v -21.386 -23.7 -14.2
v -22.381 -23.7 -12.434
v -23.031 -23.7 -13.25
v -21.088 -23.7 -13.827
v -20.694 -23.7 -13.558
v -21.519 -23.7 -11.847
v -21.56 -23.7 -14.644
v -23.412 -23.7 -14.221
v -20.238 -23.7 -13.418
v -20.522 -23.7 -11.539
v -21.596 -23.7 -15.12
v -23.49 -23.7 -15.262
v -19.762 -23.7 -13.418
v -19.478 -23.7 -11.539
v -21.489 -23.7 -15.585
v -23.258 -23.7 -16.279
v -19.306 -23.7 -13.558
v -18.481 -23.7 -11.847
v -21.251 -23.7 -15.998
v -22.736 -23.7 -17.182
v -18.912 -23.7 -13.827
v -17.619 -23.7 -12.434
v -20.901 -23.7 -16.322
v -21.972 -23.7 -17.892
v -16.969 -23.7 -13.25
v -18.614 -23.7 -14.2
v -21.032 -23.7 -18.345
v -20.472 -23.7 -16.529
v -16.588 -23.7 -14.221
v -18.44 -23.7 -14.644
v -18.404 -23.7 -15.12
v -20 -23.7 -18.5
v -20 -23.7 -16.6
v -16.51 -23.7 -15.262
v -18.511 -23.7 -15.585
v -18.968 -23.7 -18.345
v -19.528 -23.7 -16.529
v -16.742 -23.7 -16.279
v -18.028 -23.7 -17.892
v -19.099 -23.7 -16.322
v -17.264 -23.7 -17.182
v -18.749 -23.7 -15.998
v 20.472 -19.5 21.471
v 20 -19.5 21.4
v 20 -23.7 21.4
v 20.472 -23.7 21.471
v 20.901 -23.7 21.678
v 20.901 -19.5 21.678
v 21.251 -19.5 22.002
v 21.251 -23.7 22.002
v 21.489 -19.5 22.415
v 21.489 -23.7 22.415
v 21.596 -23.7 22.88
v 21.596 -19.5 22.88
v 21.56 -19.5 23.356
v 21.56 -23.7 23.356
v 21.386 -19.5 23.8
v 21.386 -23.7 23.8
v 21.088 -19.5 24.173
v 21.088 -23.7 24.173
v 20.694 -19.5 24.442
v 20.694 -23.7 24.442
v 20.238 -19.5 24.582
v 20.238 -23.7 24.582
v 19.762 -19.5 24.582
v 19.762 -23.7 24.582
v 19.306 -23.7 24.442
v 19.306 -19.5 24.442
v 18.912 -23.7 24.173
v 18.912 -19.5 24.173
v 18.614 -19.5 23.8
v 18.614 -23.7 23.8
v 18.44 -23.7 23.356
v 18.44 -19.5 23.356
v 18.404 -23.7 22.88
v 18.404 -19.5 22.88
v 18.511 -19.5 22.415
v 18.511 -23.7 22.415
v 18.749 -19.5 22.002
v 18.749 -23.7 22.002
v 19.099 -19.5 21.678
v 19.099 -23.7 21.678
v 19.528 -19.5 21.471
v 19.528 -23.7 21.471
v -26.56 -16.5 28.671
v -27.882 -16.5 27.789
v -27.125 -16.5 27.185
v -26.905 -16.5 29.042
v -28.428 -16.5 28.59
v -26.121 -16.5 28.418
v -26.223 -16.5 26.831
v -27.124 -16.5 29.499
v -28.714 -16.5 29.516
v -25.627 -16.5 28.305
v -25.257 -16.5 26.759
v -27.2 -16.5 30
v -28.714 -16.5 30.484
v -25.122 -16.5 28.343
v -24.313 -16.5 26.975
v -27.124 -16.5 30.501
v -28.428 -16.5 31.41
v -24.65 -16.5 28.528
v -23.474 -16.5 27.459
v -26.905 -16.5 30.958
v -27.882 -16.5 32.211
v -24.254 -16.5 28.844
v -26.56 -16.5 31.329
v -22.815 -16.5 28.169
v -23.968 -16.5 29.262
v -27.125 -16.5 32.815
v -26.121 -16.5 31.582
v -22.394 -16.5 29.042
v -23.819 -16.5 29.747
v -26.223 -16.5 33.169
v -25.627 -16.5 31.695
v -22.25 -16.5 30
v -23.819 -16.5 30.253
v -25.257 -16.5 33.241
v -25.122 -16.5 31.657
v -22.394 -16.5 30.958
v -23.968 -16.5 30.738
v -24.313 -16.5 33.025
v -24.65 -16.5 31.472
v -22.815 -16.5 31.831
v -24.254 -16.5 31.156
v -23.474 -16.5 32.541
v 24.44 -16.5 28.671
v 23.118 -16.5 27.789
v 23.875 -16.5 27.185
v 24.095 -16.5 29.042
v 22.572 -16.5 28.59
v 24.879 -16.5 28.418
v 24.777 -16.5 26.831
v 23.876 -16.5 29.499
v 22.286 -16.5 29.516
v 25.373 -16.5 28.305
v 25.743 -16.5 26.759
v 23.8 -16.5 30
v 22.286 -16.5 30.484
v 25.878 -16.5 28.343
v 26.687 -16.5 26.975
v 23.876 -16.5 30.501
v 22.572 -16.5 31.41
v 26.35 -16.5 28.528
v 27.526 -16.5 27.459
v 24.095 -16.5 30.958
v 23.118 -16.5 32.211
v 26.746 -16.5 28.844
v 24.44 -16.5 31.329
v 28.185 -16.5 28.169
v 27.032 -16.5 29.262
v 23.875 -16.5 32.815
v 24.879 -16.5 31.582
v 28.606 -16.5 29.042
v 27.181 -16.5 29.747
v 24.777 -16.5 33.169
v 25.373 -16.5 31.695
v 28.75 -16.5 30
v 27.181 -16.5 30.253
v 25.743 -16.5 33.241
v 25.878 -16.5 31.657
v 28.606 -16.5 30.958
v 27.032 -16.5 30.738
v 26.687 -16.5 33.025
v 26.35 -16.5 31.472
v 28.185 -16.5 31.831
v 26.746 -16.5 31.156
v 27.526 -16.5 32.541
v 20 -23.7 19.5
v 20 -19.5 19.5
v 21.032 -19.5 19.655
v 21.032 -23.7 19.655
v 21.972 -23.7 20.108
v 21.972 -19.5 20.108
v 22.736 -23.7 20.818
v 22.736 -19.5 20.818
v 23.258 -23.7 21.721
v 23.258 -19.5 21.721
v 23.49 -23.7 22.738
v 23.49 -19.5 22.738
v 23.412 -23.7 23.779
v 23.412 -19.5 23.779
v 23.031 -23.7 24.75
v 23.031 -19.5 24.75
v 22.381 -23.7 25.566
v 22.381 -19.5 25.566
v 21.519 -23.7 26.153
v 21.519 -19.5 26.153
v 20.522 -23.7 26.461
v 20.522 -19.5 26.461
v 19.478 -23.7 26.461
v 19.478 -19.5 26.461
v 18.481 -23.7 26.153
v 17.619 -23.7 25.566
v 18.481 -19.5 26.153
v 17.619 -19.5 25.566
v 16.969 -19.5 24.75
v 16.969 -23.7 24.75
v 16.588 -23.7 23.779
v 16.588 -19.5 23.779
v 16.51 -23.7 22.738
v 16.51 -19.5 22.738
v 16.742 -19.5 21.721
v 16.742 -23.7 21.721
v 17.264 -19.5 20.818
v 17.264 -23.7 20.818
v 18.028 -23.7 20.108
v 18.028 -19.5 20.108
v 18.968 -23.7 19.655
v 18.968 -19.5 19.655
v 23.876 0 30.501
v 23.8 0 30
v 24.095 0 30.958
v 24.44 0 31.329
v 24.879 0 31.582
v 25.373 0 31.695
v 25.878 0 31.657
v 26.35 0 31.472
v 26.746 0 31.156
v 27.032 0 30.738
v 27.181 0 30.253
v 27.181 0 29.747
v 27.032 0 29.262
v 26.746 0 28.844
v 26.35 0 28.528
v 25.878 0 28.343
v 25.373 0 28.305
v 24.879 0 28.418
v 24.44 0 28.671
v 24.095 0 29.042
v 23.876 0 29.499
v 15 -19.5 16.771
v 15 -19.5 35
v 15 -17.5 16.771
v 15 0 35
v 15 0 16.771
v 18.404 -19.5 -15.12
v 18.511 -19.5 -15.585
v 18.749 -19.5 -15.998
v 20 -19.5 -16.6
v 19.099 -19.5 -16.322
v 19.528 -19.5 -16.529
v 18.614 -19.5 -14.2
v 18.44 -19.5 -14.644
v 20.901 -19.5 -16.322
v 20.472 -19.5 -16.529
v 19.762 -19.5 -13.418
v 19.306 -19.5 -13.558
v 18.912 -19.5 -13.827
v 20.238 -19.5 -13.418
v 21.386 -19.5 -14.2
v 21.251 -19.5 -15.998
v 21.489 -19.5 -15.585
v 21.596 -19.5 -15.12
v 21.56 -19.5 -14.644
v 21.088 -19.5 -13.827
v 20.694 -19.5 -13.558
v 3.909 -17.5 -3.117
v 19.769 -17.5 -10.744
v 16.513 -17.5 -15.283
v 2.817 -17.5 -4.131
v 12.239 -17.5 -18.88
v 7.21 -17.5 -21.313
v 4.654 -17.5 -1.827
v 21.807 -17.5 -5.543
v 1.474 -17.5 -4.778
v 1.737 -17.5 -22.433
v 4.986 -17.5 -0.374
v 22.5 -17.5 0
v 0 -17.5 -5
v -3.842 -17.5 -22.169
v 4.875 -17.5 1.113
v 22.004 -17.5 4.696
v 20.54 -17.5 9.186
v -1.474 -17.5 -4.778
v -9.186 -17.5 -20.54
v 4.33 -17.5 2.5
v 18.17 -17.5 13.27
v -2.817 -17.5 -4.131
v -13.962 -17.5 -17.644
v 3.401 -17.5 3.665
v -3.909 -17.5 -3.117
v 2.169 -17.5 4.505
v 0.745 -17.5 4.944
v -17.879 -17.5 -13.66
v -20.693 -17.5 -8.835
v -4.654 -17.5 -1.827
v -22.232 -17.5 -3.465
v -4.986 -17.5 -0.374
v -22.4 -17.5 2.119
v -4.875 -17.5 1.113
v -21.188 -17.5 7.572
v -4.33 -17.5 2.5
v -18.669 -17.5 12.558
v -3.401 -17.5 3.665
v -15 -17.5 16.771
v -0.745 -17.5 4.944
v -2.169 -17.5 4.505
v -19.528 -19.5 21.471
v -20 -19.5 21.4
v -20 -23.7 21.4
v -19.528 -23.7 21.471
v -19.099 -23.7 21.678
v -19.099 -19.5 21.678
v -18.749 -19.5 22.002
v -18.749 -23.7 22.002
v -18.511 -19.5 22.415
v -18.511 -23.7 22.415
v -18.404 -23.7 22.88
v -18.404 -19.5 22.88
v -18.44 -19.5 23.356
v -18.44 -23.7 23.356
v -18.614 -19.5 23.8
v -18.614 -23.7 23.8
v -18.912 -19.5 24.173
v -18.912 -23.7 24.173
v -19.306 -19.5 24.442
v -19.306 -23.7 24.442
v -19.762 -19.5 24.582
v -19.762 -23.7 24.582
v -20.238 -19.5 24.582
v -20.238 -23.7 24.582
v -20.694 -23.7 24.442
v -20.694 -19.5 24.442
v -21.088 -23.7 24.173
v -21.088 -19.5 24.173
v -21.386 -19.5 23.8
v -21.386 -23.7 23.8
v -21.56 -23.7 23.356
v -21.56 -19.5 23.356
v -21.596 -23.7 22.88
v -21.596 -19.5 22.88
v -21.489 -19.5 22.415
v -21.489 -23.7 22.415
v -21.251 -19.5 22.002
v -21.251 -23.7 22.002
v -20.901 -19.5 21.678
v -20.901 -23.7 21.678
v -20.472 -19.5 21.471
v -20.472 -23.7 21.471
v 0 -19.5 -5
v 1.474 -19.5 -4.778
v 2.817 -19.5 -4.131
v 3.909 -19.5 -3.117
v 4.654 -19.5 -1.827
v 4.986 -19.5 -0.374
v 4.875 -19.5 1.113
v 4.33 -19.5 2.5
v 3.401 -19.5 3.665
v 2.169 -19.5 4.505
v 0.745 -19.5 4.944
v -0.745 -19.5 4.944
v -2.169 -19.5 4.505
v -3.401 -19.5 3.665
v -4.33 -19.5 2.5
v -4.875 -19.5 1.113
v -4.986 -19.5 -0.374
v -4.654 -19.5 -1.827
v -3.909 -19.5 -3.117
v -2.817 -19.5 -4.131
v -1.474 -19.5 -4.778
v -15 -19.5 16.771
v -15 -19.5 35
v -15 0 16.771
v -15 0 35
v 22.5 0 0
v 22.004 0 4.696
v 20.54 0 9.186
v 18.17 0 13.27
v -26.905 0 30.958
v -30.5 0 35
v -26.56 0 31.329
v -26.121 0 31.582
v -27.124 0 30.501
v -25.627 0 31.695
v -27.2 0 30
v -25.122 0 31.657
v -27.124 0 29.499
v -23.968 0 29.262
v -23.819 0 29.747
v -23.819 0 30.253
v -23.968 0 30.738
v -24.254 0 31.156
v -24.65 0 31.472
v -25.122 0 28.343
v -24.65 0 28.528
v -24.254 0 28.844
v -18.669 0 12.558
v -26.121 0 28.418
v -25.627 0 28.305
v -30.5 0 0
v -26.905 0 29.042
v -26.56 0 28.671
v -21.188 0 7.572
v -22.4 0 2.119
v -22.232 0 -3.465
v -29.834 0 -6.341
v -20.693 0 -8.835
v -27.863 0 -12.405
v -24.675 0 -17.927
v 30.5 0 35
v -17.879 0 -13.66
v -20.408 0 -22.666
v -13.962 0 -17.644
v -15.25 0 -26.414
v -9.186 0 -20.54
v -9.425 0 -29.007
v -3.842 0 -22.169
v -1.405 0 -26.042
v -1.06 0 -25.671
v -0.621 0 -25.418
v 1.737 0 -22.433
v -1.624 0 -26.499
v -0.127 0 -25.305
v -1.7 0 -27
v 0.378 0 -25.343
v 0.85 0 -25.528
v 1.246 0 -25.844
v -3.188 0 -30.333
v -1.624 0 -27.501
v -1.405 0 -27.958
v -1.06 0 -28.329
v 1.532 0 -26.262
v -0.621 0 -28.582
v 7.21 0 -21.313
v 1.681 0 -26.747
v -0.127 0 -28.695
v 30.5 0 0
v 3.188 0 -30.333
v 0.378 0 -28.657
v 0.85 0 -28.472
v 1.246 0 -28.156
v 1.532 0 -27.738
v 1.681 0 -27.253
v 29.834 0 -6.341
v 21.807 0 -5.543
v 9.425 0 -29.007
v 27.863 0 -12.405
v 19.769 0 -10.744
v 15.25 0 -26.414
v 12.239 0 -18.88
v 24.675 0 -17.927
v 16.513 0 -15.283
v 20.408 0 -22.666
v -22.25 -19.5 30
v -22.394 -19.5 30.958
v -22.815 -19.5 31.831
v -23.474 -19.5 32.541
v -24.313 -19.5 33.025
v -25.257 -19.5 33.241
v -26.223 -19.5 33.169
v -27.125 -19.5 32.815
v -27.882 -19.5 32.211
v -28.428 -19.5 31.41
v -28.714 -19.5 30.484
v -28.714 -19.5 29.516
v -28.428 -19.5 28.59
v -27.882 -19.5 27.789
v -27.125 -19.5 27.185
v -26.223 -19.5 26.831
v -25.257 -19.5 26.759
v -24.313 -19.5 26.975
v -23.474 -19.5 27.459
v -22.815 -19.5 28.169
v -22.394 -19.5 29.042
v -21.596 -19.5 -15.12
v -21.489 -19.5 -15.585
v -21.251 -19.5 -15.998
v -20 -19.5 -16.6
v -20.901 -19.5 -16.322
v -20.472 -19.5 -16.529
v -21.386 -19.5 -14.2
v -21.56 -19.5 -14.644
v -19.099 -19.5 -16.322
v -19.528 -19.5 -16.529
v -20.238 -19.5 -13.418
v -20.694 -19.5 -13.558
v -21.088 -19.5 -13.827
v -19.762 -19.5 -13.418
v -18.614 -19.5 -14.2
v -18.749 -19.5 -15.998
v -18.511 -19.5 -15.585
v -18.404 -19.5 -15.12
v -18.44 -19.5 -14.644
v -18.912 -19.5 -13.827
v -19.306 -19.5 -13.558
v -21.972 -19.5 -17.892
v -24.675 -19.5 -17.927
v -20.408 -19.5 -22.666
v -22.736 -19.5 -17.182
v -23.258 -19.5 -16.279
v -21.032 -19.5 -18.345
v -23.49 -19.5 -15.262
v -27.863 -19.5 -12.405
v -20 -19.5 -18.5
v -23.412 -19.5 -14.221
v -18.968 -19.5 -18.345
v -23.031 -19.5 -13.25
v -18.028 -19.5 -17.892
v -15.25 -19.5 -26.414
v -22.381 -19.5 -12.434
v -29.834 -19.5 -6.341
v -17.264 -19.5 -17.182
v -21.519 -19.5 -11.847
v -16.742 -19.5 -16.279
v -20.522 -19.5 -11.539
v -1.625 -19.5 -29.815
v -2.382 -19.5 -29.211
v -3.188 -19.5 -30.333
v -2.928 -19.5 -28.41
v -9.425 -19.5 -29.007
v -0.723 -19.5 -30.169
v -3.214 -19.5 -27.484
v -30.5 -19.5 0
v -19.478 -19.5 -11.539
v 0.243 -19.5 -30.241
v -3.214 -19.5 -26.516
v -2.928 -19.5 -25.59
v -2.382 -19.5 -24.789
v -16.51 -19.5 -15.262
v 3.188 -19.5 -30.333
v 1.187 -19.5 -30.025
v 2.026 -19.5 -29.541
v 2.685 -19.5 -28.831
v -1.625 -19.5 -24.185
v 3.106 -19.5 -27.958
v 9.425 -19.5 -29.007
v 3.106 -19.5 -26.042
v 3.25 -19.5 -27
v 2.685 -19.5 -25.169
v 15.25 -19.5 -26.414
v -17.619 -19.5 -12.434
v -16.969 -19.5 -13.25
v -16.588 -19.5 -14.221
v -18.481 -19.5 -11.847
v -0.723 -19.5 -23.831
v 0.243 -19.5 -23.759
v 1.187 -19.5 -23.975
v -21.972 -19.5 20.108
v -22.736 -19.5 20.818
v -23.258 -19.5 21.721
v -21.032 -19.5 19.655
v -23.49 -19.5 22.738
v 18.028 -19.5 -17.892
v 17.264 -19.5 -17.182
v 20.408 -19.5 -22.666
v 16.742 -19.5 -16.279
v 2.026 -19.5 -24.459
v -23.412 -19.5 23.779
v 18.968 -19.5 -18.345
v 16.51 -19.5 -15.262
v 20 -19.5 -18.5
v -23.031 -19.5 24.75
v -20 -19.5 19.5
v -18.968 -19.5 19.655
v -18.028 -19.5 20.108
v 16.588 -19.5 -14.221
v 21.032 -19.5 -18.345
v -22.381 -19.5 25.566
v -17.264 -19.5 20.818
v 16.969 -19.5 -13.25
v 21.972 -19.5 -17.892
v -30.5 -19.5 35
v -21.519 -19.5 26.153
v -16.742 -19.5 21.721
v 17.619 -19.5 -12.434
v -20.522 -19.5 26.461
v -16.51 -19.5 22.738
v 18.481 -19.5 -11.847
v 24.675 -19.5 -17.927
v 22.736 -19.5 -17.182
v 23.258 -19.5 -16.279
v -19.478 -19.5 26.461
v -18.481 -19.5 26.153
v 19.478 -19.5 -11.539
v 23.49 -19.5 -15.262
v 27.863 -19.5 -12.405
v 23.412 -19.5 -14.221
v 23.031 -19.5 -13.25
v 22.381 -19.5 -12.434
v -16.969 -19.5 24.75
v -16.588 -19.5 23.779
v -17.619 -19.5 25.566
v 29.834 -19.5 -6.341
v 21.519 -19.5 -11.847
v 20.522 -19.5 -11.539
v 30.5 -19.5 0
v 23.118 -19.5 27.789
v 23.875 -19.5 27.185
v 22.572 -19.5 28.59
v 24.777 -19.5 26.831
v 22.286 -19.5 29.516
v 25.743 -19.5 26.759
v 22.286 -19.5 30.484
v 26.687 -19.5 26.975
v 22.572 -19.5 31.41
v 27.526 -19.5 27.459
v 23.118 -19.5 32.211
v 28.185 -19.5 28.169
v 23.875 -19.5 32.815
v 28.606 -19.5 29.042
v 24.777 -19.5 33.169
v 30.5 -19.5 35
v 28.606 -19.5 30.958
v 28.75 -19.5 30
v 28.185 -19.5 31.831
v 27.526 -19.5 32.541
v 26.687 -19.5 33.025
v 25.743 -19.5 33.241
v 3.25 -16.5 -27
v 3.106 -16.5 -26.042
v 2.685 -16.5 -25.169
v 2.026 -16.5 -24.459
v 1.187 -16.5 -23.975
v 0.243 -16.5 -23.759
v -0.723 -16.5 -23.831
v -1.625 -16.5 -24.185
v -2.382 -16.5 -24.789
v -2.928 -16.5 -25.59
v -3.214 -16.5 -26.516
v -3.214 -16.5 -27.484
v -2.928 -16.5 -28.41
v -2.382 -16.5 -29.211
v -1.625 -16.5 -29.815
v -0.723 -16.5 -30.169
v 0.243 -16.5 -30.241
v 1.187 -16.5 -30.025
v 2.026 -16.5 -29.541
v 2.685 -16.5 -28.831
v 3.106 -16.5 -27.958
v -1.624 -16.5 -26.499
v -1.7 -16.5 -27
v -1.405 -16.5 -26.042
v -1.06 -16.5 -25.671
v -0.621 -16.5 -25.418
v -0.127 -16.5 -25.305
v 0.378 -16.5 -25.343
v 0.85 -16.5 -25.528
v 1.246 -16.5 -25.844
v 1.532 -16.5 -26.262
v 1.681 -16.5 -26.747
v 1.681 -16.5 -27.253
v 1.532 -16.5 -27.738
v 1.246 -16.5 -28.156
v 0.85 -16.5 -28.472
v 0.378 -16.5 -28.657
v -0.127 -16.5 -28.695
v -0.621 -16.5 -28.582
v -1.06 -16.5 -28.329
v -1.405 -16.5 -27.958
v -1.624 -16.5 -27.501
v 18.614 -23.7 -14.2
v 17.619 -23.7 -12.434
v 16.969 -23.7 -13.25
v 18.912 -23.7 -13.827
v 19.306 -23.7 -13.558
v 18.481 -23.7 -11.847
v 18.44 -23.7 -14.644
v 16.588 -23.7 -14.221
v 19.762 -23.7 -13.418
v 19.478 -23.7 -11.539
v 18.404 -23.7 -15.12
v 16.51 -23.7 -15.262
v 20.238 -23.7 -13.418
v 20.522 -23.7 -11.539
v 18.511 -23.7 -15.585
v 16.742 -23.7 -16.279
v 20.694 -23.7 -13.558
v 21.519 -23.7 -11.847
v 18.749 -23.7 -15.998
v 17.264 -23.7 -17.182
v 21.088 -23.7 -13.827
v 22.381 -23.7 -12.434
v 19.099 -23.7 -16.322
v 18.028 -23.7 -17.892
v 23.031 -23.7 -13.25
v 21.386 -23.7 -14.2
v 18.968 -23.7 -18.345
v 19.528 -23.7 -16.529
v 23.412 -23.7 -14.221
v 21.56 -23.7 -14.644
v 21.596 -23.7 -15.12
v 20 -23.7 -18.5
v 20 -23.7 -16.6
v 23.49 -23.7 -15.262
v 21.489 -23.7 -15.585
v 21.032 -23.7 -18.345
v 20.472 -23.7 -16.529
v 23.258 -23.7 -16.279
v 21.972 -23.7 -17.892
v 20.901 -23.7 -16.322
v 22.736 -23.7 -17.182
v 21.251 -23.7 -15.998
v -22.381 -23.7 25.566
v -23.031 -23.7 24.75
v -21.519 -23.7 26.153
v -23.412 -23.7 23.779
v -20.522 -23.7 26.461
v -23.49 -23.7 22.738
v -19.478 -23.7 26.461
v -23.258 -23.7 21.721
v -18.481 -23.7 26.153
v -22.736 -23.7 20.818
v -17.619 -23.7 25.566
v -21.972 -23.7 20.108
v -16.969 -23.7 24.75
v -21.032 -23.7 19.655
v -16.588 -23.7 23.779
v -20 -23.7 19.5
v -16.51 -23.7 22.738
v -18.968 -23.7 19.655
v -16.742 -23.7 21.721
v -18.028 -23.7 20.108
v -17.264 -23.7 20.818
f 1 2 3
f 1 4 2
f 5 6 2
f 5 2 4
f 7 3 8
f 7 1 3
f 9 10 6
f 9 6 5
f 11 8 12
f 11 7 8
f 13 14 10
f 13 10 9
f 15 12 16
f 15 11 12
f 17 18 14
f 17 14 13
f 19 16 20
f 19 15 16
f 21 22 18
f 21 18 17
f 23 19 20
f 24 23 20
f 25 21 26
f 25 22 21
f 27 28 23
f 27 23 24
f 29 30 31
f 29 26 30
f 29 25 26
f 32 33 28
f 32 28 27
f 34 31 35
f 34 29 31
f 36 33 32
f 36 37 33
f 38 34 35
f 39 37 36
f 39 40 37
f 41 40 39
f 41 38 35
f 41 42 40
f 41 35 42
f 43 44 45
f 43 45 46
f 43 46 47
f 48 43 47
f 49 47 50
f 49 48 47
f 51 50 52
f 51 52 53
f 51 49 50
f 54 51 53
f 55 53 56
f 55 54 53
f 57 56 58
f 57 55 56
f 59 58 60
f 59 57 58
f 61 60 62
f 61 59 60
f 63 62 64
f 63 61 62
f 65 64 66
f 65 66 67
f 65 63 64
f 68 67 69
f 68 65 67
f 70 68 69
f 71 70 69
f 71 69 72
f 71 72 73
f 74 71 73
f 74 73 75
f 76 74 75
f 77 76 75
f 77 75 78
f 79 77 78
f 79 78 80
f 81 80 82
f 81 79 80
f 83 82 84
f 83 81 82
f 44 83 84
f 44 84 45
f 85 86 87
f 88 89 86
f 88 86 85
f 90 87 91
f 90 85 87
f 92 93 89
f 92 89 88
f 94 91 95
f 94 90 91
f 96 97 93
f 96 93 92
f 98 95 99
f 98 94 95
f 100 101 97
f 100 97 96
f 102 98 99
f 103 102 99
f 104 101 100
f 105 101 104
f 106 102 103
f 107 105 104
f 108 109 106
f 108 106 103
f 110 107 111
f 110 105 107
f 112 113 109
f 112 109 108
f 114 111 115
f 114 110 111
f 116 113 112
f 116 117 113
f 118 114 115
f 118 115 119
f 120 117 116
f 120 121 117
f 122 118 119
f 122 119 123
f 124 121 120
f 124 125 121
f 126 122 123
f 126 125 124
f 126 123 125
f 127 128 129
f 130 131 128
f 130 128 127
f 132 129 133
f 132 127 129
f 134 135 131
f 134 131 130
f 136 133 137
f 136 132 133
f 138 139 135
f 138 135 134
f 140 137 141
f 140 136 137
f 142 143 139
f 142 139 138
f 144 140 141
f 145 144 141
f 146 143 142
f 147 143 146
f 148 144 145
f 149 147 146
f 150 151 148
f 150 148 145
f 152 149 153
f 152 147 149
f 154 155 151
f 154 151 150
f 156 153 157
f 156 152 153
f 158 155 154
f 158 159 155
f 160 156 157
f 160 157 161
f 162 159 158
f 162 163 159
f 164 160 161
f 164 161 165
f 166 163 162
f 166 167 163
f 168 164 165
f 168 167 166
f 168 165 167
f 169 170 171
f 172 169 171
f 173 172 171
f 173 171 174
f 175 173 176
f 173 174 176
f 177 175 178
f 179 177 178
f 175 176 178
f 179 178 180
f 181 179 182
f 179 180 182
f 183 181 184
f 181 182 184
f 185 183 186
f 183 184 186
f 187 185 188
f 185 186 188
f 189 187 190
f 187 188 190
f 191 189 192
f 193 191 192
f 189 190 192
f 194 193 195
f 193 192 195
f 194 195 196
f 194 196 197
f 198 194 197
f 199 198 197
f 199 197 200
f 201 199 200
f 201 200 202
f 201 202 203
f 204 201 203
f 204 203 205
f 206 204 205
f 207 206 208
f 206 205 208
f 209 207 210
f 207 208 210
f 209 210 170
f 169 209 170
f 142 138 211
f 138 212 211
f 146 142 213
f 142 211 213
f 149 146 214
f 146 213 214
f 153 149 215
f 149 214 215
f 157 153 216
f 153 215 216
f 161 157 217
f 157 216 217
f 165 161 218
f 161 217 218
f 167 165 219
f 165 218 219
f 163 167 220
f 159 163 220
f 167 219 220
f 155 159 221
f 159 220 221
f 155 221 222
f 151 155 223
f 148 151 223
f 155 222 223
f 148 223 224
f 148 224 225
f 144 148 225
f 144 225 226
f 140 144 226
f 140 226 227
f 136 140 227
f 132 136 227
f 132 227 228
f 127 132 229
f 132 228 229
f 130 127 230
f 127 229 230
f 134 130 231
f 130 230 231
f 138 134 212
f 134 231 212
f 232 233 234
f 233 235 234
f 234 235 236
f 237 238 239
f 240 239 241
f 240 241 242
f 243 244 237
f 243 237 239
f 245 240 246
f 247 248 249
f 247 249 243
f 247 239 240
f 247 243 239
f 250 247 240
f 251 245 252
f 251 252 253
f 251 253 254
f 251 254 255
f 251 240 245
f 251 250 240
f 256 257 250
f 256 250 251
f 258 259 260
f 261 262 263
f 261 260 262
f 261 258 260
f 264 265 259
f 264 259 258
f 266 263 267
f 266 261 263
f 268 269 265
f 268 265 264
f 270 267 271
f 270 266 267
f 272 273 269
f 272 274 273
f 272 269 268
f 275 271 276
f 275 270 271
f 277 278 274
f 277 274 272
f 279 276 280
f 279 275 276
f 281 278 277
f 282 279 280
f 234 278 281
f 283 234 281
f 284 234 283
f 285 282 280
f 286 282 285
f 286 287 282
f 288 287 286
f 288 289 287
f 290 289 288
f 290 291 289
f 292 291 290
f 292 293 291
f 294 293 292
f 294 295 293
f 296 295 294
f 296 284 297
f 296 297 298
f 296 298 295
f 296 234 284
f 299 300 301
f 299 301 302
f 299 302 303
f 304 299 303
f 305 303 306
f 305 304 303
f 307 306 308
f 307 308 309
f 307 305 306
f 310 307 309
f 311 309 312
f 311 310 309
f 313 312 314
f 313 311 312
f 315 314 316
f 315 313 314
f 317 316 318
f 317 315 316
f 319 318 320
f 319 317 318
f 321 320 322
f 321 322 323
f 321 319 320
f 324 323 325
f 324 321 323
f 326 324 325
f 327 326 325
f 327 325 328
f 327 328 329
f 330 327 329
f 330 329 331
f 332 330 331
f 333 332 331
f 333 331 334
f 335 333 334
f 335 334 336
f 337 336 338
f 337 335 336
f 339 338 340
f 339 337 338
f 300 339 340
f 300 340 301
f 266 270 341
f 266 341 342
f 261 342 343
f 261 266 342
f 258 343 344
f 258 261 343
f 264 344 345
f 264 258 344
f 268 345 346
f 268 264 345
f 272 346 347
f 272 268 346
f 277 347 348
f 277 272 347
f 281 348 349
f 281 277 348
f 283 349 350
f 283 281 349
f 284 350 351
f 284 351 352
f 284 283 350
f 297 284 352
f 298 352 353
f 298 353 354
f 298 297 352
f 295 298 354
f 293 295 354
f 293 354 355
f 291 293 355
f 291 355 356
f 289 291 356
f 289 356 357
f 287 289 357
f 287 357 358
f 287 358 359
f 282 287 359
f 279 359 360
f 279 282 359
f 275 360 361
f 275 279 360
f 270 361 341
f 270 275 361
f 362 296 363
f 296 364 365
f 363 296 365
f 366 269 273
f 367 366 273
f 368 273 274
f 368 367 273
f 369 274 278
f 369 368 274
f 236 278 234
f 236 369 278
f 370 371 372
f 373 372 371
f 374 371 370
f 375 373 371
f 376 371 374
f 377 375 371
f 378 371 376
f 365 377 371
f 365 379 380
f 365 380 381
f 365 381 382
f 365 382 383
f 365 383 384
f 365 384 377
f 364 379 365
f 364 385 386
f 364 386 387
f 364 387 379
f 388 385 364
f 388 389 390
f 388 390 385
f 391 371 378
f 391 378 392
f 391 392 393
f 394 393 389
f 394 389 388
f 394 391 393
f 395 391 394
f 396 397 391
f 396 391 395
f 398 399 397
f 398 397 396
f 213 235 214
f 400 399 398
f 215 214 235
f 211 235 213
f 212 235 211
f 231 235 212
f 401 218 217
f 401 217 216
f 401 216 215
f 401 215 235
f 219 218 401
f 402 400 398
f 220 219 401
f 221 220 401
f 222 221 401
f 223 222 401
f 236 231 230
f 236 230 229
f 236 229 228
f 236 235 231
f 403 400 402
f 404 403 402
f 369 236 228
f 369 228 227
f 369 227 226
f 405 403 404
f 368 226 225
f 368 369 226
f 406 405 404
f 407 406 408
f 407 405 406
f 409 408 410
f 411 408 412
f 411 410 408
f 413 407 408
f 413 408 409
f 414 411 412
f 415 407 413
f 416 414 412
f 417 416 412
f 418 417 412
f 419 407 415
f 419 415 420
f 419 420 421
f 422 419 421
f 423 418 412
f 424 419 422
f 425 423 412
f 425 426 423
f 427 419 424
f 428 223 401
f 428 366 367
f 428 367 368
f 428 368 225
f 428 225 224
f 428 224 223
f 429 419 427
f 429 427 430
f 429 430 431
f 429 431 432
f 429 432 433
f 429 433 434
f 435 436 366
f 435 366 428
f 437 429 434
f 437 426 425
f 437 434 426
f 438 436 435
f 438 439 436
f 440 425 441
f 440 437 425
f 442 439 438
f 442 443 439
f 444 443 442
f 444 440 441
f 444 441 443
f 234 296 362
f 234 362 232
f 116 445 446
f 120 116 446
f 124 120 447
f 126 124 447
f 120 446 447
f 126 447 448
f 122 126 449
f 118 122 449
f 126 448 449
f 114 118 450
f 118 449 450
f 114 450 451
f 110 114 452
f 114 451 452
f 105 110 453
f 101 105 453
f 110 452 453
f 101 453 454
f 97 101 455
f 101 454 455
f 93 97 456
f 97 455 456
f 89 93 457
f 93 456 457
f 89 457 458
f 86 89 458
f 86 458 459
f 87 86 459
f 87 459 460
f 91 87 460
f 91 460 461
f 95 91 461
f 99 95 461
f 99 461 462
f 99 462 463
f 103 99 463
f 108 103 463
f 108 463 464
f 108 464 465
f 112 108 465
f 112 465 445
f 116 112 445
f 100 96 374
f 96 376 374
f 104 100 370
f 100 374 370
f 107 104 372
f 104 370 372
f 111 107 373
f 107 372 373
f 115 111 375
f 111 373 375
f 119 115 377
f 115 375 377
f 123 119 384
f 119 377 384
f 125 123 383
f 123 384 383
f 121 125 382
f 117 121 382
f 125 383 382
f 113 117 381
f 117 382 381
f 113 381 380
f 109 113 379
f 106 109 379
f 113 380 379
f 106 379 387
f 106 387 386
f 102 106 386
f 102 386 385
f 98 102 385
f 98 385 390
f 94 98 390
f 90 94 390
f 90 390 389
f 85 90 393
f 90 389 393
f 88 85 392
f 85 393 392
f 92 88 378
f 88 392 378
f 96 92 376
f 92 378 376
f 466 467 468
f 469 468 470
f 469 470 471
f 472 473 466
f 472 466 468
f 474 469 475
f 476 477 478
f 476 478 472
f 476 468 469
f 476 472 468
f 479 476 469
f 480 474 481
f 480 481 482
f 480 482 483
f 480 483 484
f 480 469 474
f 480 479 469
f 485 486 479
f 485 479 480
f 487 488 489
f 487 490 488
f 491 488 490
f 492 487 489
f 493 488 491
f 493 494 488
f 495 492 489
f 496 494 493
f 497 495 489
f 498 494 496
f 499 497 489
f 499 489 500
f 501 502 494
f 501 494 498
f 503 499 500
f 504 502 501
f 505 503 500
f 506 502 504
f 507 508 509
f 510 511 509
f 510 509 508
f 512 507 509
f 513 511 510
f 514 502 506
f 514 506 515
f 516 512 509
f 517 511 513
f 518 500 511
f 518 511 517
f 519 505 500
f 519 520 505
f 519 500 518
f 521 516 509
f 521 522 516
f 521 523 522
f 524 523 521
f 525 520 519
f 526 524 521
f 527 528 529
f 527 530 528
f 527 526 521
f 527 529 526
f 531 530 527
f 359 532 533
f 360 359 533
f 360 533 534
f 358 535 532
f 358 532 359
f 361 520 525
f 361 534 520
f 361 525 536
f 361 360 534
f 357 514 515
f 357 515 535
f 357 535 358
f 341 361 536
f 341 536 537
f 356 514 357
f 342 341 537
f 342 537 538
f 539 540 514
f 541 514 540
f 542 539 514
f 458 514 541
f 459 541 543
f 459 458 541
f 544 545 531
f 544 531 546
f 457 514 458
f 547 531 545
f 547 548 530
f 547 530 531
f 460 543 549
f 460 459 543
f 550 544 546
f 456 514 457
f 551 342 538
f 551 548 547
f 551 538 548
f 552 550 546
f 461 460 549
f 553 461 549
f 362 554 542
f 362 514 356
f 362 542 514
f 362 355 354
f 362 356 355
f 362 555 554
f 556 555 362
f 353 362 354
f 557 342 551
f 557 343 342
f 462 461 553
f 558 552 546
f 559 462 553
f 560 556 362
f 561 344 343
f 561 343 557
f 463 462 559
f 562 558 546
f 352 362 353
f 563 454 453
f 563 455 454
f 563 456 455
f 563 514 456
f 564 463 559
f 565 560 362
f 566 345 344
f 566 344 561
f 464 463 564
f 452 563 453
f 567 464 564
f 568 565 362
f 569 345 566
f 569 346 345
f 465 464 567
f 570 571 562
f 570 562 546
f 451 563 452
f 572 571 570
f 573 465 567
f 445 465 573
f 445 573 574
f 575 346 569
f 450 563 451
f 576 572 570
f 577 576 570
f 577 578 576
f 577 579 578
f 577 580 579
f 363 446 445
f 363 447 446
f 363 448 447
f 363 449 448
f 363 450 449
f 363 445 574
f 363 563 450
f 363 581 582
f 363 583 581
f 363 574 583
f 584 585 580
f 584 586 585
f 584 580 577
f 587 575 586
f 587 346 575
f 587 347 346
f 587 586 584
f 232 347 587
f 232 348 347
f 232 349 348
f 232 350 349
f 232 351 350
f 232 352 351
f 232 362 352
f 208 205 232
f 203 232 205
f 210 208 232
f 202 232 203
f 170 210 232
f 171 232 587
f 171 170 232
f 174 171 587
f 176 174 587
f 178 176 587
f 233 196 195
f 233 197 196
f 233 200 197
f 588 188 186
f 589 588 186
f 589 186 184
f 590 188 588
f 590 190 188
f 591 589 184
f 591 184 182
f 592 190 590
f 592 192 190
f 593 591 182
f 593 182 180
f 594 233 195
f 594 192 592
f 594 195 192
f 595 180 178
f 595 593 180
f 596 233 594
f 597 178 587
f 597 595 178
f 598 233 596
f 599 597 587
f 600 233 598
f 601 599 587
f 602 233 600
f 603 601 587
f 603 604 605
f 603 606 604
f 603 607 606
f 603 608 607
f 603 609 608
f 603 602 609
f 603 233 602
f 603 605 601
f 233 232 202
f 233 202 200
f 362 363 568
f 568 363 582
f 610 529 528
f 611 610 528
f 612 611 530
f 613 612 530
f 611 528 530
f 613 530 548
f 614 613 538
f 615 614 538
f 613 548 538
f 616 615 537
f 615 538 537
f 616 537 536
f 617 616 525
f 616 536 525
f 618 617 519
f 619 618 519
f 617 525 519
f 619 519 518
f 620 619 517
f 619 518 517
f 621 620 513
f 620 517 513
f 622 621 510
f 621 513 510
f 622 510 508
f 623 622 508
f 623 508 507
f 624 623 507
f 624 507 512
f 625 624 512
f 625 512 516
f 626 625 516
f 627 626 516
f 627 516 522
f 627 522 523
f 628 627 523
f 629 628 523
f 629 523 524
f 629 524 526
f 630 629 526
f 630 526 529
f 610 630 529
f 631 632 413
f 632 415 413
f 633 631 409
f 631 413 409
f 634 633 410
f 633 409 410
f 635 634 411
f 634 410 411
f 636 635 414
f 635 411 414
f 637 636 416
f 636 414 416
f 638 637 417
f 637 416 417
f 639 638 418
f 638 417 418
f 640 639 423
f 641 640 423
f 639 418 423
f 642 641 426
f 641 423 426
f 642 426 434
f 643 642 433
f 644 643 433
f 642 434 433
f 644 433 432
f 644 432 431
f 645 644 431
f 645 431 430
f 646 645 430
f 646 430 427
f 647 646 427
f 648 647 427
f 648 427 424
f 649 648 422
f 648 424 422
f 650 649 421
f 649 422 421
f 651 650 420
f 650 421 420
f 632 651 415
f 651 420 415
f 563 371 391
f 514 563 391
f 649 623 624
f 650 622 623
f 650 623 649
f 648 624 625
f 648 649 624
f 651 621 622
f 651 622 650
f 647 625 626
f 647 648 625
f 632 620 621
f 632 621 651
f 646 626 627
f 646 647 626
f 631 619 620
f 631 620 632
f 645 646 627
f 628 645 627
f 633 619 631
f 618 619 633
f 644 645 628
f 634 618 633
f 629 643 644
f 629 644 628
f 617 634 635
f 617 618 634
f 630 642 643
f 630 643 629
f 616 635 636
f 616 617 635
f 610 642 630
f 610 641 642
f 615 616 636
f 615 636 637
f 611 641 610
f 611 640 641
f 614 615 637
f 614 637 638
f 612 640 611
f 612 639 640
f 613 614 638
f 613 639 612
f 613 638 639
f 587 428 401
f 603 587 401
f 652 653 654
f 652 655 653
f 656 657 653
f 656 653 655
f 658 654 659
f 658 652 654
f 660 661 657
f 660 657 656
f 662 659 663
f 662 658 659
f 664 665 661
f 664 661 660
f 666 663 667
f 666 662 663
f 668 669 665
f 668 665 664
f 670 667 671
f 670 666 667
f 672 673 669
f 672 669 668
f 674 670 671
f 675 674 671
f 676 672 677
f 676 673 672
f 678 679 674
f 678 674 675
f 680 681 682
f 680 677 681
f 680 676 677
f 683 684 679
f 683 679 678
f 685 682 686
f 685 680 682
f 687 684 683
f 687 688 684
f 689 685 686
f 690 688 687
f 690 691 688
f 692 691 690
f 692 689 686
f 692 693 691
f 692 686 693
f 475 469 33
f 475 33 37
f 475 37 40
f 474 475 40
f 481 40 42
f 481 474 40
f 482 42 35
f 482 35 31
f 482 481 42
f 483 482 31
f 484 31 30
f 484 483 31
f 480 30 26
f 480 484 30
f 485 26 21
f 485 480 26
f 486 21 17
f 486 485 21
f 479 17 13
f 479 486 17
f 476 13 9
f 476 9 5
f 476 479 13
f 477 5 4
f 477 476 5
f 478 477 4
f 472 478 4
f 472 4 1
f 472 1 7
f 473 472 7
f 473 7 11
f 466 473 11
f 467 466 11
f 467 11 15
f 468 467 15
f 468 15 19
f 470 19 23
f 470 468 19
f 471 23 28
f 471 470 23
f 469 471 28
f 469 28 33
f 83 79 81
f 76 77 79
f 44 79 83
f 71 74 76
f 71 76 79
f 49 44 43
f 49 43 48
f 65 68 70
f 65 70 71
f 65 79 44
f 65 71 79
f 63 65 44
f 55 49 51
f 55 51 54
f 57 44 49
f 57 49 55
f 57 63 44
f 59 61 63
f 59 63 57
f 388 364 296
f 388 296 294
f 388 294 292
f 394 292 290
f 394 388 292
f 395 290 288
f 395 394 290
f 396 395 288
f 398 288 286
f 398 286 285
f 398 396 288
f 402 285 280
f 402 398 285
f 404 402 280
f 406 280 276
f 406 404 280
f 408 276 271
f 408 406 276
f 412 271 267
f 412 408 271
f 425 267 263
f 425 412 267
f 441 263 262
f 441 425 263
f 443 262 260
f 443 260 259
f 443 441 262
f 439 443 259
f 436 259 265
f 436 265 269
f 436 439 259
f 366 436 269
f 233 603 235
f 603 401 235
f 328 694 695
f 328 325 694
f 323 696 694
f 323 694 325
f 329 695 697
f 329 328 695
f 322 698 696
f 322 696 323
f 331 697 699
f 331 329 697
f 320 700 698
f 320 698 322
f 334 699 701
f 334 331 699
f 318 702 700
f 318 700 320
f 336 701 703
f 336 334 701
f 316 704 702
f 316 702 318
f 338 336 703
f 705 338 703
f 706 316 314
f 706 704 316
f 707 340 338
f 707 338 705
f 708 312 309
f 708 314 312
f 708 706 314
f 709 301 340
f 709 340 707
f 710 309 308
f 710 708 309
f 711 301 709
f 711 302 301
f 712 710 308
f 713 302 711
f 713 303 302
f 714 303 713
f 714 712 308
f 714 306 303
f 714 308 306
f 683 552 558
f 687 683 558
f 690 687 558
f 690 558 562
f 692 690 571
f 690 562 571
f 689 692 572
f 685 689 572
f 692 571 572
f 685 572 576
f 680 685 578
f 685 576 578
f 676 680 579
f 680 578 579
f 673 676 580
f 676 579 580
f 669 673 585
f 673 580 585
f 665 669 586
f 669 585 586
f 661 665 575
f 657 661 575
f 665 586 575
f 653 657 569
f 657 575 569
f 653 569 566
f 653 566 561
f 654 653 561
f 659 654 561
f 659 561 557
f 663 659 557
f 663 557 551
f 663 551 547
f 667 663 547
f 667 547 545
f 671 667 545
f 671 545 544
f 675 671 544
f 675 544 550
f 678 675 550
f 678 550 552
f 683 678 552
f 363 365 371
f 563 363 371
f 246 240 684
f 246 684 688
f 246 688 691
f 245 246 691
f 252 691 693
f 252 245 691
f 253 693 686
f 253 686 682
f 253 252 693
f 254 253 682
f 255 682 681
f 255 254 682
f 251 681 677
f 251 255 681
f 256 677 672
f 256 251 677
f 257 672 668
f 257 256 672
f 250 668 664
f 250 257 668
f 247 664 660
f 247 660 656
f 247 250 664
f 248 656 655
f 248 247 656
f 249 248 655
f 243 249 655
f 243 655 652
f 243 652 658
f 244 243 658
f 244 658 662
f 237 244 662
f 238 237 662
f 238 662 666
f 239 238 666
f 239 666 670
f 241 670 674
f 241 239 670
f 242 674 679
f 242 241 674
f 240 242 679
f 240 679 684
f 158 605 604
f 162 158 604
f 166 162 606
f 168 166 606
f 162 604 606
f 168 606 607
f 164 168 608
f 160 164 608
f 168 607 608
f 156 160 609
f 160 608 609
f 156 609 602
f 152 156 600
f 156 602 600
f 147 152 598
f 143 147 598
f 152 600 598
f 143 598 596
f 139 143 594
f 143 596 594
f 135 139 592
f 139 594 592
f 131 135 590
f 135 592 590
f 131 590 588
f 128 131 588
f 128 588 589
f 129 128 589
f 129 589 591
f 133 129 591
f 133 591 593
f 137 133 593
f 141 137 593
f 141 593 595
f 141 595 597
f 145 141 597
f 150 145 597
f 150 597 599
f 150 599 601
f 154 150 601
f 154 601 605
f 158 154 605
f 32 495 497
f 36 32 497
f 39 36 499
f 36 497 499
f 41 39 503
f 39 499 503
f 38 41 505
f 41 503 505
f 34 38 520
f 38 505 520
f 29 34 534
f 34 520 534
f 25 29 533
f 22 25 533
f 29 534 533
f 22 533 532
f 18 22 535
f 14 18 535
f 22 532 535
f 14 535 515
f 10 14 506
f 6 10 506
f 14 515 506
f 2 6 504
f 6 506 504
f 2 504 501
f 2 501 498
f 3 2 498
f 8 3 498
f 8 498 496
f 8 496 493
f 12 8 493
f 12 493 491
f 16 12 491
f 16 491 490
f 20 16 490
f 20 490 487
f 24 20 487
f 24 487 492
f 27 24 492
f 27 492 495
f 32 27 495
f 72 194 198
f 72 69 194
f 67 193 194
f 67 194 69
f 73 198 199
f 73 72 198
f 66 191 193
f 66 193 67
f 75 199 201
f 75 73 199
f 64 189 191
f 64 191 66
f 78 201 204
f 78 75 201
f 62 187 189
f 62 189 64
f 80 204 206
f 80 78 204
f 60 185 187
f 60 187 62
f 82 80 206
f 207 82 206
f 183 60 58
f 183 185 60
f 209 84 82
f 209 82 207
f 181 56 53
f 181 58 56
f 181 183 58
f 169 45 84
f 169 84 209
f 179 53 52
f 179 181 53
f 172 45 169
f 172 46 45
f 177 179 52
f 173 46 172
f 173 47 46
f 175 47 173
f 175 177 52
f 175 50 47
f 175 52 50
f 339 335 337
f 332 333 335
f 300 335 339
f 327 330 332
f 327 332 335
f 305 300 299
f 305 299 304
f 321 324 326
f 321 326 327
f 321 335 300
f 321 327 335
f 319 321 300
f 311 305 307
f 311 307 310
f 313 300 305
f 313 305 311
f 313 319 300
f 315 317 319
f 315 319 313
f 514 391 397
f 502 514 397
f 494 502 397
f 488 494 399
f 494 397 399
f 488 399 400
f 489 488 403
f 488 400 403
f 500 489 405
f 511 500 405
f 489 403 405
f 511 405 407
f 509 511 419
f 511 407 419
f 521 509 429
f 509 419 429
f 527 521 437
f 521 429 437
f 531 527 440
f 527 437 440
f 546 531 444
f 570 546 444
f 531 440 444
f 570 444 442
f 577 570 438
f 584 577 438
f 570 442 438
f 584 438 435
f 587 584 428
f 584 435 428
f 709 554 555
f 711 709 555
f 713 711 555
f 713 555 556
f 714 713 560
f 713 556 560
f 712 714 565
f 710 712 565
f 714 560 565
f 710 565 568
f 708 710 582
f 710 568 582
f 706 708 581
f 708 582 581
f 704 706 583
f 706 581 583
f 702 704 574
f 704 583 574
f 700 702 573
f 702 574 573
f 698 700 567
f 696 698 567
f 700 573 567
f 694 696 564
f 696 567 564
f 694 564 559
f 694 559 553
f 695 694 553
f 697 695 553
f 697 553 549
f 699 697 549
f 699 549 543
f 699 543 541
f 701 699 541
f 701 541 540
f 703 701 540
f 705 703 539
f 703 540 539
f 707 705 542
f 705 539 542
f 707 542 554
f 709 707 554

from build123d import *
from build123d.topology import SkipClean

# Parameters (mm, degrees)
BOSS_EXTRUDE1_DEPTH            = 17.5
SKETCH2_R                      = 5
BOSS_EXTRUDE2_DEPTH            = 2
SKETCH3_R                      = 3.5
SKETCH3_R_2                    = 1.6
BOSS_EXTRUDE3_DEPTH            = 4.2
CBORE_FOR_M3_SHCS1_D           = 3.4
CBORE_FOR_M3_SHCS1_DEPTH       = 19.5
CBORE_FOR_M3_SHCS1_CBORE_D     = 6.5
CBORE_FOR_M3_SHCS1_CBORE_DEPTH = 3
CBORE_FOR_M3_SHCS1_TIP         = 1.021463052


with BuildPart() as part:
    # Sketch1 → Boss-Extrude1 (new body)
    with BuildSketch(Plane(origin=(0, 0, 0), x_dir=(1, 0, 0), z_dir=(0, 1, 0))):
        with BuildLine():
            Line((-15, -26.55654345), (-15, -16.770509831))
            ThreePointArc((-15, -16.770509831), (-9.185586535, 20.539595906), (22.5, 0))
            ThreePointArc((22.5, 0), (20.539595906, -9.185586535), (15, -16.770509831))
            Line((15, -16.770509831), (15, -26.55654345))
            ThreePointArc((15, -26.55654345), (26.34150717, -15.374491862), (30.5, 0))
            ThreePointArc((30.5, 0), (0, 30.5), (-30.5, 0))
            ThreePointArc((-30.5, 0), (-26.34150717, -15.374491862), (-15, -26.55654345))
        make_face()
        with BuildLine():
            Line((-15, -35), (-15, -26.55654345))
            ThreePointArc((-15, -26.55654345), (-26.34150717, -15.374491862), (-30.5, 0))
            Line((-30.5, 0), (-30.5, -35))
            Line((-30.5, -35), (-15, -35))
        make_face()
        with BuildLine():
            ThreePointArc((30.5, 0), (26.34150717, -15.374491862), (15, -26.55654345))
            Line((15, -26.55654345), (15, -35))
            Line((15, -35), (30.5, -35))
            Line((30.5, -35), (30.5, 0))
        make_face()
    extrude(amount=-BOSS_EXTRUDE1_DEPTH)

    # Sketch2 → Boss-Extrude2 (add)
    # profile 1 of 2: a face of its own
    with SkipClean():  # the faces are left unmerged after this step: merging them gives an invalid solid
        with BuildSketch(Plane.XZ.offset(17.5)):
            with BuildLine():
                Line((-15, 16.770509831), (15, 16.770509831))
                ThreePointArc((15, 16.770509831), (0, -22.5), (-15, 16.770509831))
            make_face()
            with Locations(Location((0, 0, 0), (0, 0, 270))):
                Circle(SKETCH2_R, mode=Mode.SUBTRACT)
        # profile 2 of 2: a face of its own
        with BuildSketch(Plane.XZ.offset(17.5)):
            with BuildLine():
                Line((30.5, 35), (15, 35))
                Line((15, 35), (15, 16.770509831))
                ThreePointArc((15, 16.770509831), (0, -22.5), (-15, 16.770509831))
                Line((-15, 16.770509831), (-15, 35))
                Line((-15, 35), (-30.5, 35))
                Line((-30.5, 35), (-30.5, 0))
                ThreePointArc((-30.5, 0), (0, -30.5), (30.5, 0))
                Line((30.5, 0), (30.5, 35))
            make_face()
        extrude(amount=BOSS_EXTRUDE2_DEPTH)

    # Sketch3 → Boss-Extrude3 (add)
    # profile 1 of 4: a face of its own
    with SkipClean():  # the faces are left unmerged after this step: merging them gives an invalid solid
        with BuildSketch(Plane.XZ.offset(19.5)):
            with Locations(Location((-20, 23, 0), (0, 0, 270))):
                Circle(SKETCH3_R)
            with Locations(Location((-20, 23, 0), (0, 0, 270))):
                Circle(SKETCH3_R_2, mode=Mode.SUBTRACT)
        # profile 2 of 4: a face of its own
        with BuildSketch(Plane.XZ.offset(19.5)):
            with Locations(Location((20, 23, 0), (0, 0, 270))):
                Circle(SKETCH3_R)
            with Locations(Location((20, 23, 0), (0, 0, 270))):
                Circle(SKETCH3_R_2, mode=Mode.SUBTRACT)
        # profile 3 of 4: a face of its own
        with BuildSketch(Plane.XZ.offset(19.5)):
            with Locations(Location((20, -15, 0), (0, 0, 270))):
                Circle(SKETCH3_R)
            with Locations(Location((20, -15, 0), (0, 0, 270))):
                Circle(SKETCH3_R_2, mode=Mode.SUBTRACT)
        # profile 4 of 4: a face of its own
        with BuildSketch(Plane.XZ.offset(19.5)):
            with Locations(Location((-20, -15, 0), (0, 0, 270))):
                Circle(SKETCH3_R)
            with Locations(Location((-20, -15, 0), (0, 0, 270))):
                Circle(SKETCH3_R_2, mode=Mode.SUBTRACT)
        extrude(amount=BOSS_EXTRUDE3_DEPTH)

    # CBORE for M3 SHCS1
    with Locations(Plane.XZ.offset(19.5)):
        with Locations((0, -27), (25.5, 30), (-25.5, 30)):
            CounterBoreHole(CBORE_FOR_M3_SHCS1_D / 2, CBORE_FOR_M3_SHCS1_CBORE_D / 2, CBORE_FOR_M3_SHCS1_CBORE_DEPTH, depth=CBORE_FOR_M3_SHCS1_DEPTH)
            with Locations((0, 0, -(CBORE_FOR_M3_SHCS1_DEPTH + CBORE_FOR_M3_SHCS1_TIP / 2))):  # 118° drill point
                Cone(0, CBORE_FOR_M3_SHCS1_D / 2, CBORE_FOR_M3_SHCS1_TIP, mode=Mode.SUBTRACT)


solid = part.part
